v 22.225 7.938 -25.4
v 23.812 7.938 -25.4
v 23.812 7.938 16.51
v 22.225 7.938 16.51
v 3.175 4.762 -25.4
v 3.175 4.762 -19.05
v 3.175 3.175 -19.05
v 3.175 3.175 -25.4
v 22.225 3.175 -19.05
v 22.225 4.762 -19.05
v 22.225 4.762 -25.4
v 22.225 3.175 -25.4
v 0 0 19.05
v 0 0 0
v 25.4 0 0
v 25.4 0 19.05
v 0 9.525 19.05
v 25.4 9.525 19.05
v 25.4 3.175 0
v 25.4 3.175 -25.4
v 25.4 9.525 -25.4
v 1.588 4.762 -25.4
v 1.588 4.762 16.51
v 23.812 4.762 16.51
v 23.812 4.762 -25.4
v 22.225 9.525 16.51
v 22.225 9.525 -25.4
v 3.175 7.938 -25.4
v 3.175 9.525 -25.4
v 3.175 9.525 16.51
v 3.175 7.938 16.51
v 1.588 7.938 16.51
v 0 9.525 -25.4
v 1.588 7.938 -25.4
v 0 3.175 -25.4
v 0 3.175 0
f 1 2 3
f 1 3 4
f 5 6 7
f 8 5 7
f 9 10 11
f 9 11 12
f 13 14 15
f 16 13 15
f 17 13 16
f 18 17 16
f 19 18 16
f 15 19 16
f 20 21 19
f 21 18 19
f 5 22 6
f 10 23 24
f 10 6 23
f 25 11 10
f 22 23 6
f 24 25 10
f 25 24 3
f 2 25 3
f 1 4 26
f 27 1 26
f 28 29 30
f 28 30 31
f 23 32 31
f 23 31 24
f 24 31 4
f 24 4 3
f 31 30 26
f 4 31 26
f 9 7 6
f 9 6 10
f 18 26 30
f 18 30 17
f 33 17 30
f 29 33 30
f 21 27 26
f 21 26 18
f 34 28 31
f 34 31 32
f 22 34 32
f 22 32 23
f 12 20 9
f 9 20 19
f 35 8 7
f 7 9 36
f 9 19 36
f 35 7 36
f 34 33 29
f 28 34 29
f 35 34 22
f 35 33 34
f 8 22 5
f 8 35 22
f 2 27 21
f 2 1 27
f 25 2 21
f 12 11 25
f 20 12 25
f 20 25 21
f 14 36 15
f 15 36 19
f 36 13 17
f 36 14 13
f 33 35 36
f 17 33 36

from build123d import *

# Parameters (mm, degrees)
F0_W          = 25.4
F0_H          = 3.175
F1_DEPTH      = 19.05
F3_DEPTH      = 25.4
F3_DEPTH_BACK = 19.05
F4_W          = 25.4
F4_H          = 9.525
F5_DEPTH      = 2.54
F6_W          = 19.05
F6_H          = 1.5875
F7_DEPTH      = 6.35


with BuildPart() as f1:
    # F0 (on Top) → F1 (new body)
    with BuildSketch(Plane.XY):
        with Locations((12.7, 1.5875)):
            Rectangle(F0_W, F0_H)
    extrude(amount=F1_DEPTH)

    # F2 (on face) → F3 (join, two sides)
    with BuildSketch(Plane(origin=(0, 0, 0), x_dir=(1, 0, 0), z_dir=(0, 0, -1))) as f3_sk:
        Polygon((25.4, -9.525), (25.4, -3.175), (0, -3.175), (0, -9.525), (1.5875, -9.525), (3.175, -9.525), (3.175, -7.9375), (1.5875, -7.9375), (1.5875, -4.7625), (23.8125, -4.7625), (23.8125, -7.9375), (22.225, -7.9375), (22.225, -9.525), (23.8125, -9.525), align=None)
    extrude(amount=F3_DEPTH)
    extrude(f3_sk.sketch, amount=-F3_DEPTH_BACK)

    # F4 (on face) → F5 (join)
    with BuildSketch(Plane.XY.offset(19.05)):
        with Locations((12.7, 4.7625)):
            Rectangle(F4_W, F4_H)
    extrude(amount=-F5_DEPTH)

    # F6 (on face) → F7 (cut)
    with BuildSketch(Plane(origin=(0, 0, -25.4), x_dir=(1, 0, 0), z_dir=(0, 0, -1))):
        with Locations((12.7, -3.96875)):
            Rectangle(F6_W, F6_H)
    extrude(amount=-F7_DEPTH, mode=Mode.SUBTRACT)


solid = f1.part
